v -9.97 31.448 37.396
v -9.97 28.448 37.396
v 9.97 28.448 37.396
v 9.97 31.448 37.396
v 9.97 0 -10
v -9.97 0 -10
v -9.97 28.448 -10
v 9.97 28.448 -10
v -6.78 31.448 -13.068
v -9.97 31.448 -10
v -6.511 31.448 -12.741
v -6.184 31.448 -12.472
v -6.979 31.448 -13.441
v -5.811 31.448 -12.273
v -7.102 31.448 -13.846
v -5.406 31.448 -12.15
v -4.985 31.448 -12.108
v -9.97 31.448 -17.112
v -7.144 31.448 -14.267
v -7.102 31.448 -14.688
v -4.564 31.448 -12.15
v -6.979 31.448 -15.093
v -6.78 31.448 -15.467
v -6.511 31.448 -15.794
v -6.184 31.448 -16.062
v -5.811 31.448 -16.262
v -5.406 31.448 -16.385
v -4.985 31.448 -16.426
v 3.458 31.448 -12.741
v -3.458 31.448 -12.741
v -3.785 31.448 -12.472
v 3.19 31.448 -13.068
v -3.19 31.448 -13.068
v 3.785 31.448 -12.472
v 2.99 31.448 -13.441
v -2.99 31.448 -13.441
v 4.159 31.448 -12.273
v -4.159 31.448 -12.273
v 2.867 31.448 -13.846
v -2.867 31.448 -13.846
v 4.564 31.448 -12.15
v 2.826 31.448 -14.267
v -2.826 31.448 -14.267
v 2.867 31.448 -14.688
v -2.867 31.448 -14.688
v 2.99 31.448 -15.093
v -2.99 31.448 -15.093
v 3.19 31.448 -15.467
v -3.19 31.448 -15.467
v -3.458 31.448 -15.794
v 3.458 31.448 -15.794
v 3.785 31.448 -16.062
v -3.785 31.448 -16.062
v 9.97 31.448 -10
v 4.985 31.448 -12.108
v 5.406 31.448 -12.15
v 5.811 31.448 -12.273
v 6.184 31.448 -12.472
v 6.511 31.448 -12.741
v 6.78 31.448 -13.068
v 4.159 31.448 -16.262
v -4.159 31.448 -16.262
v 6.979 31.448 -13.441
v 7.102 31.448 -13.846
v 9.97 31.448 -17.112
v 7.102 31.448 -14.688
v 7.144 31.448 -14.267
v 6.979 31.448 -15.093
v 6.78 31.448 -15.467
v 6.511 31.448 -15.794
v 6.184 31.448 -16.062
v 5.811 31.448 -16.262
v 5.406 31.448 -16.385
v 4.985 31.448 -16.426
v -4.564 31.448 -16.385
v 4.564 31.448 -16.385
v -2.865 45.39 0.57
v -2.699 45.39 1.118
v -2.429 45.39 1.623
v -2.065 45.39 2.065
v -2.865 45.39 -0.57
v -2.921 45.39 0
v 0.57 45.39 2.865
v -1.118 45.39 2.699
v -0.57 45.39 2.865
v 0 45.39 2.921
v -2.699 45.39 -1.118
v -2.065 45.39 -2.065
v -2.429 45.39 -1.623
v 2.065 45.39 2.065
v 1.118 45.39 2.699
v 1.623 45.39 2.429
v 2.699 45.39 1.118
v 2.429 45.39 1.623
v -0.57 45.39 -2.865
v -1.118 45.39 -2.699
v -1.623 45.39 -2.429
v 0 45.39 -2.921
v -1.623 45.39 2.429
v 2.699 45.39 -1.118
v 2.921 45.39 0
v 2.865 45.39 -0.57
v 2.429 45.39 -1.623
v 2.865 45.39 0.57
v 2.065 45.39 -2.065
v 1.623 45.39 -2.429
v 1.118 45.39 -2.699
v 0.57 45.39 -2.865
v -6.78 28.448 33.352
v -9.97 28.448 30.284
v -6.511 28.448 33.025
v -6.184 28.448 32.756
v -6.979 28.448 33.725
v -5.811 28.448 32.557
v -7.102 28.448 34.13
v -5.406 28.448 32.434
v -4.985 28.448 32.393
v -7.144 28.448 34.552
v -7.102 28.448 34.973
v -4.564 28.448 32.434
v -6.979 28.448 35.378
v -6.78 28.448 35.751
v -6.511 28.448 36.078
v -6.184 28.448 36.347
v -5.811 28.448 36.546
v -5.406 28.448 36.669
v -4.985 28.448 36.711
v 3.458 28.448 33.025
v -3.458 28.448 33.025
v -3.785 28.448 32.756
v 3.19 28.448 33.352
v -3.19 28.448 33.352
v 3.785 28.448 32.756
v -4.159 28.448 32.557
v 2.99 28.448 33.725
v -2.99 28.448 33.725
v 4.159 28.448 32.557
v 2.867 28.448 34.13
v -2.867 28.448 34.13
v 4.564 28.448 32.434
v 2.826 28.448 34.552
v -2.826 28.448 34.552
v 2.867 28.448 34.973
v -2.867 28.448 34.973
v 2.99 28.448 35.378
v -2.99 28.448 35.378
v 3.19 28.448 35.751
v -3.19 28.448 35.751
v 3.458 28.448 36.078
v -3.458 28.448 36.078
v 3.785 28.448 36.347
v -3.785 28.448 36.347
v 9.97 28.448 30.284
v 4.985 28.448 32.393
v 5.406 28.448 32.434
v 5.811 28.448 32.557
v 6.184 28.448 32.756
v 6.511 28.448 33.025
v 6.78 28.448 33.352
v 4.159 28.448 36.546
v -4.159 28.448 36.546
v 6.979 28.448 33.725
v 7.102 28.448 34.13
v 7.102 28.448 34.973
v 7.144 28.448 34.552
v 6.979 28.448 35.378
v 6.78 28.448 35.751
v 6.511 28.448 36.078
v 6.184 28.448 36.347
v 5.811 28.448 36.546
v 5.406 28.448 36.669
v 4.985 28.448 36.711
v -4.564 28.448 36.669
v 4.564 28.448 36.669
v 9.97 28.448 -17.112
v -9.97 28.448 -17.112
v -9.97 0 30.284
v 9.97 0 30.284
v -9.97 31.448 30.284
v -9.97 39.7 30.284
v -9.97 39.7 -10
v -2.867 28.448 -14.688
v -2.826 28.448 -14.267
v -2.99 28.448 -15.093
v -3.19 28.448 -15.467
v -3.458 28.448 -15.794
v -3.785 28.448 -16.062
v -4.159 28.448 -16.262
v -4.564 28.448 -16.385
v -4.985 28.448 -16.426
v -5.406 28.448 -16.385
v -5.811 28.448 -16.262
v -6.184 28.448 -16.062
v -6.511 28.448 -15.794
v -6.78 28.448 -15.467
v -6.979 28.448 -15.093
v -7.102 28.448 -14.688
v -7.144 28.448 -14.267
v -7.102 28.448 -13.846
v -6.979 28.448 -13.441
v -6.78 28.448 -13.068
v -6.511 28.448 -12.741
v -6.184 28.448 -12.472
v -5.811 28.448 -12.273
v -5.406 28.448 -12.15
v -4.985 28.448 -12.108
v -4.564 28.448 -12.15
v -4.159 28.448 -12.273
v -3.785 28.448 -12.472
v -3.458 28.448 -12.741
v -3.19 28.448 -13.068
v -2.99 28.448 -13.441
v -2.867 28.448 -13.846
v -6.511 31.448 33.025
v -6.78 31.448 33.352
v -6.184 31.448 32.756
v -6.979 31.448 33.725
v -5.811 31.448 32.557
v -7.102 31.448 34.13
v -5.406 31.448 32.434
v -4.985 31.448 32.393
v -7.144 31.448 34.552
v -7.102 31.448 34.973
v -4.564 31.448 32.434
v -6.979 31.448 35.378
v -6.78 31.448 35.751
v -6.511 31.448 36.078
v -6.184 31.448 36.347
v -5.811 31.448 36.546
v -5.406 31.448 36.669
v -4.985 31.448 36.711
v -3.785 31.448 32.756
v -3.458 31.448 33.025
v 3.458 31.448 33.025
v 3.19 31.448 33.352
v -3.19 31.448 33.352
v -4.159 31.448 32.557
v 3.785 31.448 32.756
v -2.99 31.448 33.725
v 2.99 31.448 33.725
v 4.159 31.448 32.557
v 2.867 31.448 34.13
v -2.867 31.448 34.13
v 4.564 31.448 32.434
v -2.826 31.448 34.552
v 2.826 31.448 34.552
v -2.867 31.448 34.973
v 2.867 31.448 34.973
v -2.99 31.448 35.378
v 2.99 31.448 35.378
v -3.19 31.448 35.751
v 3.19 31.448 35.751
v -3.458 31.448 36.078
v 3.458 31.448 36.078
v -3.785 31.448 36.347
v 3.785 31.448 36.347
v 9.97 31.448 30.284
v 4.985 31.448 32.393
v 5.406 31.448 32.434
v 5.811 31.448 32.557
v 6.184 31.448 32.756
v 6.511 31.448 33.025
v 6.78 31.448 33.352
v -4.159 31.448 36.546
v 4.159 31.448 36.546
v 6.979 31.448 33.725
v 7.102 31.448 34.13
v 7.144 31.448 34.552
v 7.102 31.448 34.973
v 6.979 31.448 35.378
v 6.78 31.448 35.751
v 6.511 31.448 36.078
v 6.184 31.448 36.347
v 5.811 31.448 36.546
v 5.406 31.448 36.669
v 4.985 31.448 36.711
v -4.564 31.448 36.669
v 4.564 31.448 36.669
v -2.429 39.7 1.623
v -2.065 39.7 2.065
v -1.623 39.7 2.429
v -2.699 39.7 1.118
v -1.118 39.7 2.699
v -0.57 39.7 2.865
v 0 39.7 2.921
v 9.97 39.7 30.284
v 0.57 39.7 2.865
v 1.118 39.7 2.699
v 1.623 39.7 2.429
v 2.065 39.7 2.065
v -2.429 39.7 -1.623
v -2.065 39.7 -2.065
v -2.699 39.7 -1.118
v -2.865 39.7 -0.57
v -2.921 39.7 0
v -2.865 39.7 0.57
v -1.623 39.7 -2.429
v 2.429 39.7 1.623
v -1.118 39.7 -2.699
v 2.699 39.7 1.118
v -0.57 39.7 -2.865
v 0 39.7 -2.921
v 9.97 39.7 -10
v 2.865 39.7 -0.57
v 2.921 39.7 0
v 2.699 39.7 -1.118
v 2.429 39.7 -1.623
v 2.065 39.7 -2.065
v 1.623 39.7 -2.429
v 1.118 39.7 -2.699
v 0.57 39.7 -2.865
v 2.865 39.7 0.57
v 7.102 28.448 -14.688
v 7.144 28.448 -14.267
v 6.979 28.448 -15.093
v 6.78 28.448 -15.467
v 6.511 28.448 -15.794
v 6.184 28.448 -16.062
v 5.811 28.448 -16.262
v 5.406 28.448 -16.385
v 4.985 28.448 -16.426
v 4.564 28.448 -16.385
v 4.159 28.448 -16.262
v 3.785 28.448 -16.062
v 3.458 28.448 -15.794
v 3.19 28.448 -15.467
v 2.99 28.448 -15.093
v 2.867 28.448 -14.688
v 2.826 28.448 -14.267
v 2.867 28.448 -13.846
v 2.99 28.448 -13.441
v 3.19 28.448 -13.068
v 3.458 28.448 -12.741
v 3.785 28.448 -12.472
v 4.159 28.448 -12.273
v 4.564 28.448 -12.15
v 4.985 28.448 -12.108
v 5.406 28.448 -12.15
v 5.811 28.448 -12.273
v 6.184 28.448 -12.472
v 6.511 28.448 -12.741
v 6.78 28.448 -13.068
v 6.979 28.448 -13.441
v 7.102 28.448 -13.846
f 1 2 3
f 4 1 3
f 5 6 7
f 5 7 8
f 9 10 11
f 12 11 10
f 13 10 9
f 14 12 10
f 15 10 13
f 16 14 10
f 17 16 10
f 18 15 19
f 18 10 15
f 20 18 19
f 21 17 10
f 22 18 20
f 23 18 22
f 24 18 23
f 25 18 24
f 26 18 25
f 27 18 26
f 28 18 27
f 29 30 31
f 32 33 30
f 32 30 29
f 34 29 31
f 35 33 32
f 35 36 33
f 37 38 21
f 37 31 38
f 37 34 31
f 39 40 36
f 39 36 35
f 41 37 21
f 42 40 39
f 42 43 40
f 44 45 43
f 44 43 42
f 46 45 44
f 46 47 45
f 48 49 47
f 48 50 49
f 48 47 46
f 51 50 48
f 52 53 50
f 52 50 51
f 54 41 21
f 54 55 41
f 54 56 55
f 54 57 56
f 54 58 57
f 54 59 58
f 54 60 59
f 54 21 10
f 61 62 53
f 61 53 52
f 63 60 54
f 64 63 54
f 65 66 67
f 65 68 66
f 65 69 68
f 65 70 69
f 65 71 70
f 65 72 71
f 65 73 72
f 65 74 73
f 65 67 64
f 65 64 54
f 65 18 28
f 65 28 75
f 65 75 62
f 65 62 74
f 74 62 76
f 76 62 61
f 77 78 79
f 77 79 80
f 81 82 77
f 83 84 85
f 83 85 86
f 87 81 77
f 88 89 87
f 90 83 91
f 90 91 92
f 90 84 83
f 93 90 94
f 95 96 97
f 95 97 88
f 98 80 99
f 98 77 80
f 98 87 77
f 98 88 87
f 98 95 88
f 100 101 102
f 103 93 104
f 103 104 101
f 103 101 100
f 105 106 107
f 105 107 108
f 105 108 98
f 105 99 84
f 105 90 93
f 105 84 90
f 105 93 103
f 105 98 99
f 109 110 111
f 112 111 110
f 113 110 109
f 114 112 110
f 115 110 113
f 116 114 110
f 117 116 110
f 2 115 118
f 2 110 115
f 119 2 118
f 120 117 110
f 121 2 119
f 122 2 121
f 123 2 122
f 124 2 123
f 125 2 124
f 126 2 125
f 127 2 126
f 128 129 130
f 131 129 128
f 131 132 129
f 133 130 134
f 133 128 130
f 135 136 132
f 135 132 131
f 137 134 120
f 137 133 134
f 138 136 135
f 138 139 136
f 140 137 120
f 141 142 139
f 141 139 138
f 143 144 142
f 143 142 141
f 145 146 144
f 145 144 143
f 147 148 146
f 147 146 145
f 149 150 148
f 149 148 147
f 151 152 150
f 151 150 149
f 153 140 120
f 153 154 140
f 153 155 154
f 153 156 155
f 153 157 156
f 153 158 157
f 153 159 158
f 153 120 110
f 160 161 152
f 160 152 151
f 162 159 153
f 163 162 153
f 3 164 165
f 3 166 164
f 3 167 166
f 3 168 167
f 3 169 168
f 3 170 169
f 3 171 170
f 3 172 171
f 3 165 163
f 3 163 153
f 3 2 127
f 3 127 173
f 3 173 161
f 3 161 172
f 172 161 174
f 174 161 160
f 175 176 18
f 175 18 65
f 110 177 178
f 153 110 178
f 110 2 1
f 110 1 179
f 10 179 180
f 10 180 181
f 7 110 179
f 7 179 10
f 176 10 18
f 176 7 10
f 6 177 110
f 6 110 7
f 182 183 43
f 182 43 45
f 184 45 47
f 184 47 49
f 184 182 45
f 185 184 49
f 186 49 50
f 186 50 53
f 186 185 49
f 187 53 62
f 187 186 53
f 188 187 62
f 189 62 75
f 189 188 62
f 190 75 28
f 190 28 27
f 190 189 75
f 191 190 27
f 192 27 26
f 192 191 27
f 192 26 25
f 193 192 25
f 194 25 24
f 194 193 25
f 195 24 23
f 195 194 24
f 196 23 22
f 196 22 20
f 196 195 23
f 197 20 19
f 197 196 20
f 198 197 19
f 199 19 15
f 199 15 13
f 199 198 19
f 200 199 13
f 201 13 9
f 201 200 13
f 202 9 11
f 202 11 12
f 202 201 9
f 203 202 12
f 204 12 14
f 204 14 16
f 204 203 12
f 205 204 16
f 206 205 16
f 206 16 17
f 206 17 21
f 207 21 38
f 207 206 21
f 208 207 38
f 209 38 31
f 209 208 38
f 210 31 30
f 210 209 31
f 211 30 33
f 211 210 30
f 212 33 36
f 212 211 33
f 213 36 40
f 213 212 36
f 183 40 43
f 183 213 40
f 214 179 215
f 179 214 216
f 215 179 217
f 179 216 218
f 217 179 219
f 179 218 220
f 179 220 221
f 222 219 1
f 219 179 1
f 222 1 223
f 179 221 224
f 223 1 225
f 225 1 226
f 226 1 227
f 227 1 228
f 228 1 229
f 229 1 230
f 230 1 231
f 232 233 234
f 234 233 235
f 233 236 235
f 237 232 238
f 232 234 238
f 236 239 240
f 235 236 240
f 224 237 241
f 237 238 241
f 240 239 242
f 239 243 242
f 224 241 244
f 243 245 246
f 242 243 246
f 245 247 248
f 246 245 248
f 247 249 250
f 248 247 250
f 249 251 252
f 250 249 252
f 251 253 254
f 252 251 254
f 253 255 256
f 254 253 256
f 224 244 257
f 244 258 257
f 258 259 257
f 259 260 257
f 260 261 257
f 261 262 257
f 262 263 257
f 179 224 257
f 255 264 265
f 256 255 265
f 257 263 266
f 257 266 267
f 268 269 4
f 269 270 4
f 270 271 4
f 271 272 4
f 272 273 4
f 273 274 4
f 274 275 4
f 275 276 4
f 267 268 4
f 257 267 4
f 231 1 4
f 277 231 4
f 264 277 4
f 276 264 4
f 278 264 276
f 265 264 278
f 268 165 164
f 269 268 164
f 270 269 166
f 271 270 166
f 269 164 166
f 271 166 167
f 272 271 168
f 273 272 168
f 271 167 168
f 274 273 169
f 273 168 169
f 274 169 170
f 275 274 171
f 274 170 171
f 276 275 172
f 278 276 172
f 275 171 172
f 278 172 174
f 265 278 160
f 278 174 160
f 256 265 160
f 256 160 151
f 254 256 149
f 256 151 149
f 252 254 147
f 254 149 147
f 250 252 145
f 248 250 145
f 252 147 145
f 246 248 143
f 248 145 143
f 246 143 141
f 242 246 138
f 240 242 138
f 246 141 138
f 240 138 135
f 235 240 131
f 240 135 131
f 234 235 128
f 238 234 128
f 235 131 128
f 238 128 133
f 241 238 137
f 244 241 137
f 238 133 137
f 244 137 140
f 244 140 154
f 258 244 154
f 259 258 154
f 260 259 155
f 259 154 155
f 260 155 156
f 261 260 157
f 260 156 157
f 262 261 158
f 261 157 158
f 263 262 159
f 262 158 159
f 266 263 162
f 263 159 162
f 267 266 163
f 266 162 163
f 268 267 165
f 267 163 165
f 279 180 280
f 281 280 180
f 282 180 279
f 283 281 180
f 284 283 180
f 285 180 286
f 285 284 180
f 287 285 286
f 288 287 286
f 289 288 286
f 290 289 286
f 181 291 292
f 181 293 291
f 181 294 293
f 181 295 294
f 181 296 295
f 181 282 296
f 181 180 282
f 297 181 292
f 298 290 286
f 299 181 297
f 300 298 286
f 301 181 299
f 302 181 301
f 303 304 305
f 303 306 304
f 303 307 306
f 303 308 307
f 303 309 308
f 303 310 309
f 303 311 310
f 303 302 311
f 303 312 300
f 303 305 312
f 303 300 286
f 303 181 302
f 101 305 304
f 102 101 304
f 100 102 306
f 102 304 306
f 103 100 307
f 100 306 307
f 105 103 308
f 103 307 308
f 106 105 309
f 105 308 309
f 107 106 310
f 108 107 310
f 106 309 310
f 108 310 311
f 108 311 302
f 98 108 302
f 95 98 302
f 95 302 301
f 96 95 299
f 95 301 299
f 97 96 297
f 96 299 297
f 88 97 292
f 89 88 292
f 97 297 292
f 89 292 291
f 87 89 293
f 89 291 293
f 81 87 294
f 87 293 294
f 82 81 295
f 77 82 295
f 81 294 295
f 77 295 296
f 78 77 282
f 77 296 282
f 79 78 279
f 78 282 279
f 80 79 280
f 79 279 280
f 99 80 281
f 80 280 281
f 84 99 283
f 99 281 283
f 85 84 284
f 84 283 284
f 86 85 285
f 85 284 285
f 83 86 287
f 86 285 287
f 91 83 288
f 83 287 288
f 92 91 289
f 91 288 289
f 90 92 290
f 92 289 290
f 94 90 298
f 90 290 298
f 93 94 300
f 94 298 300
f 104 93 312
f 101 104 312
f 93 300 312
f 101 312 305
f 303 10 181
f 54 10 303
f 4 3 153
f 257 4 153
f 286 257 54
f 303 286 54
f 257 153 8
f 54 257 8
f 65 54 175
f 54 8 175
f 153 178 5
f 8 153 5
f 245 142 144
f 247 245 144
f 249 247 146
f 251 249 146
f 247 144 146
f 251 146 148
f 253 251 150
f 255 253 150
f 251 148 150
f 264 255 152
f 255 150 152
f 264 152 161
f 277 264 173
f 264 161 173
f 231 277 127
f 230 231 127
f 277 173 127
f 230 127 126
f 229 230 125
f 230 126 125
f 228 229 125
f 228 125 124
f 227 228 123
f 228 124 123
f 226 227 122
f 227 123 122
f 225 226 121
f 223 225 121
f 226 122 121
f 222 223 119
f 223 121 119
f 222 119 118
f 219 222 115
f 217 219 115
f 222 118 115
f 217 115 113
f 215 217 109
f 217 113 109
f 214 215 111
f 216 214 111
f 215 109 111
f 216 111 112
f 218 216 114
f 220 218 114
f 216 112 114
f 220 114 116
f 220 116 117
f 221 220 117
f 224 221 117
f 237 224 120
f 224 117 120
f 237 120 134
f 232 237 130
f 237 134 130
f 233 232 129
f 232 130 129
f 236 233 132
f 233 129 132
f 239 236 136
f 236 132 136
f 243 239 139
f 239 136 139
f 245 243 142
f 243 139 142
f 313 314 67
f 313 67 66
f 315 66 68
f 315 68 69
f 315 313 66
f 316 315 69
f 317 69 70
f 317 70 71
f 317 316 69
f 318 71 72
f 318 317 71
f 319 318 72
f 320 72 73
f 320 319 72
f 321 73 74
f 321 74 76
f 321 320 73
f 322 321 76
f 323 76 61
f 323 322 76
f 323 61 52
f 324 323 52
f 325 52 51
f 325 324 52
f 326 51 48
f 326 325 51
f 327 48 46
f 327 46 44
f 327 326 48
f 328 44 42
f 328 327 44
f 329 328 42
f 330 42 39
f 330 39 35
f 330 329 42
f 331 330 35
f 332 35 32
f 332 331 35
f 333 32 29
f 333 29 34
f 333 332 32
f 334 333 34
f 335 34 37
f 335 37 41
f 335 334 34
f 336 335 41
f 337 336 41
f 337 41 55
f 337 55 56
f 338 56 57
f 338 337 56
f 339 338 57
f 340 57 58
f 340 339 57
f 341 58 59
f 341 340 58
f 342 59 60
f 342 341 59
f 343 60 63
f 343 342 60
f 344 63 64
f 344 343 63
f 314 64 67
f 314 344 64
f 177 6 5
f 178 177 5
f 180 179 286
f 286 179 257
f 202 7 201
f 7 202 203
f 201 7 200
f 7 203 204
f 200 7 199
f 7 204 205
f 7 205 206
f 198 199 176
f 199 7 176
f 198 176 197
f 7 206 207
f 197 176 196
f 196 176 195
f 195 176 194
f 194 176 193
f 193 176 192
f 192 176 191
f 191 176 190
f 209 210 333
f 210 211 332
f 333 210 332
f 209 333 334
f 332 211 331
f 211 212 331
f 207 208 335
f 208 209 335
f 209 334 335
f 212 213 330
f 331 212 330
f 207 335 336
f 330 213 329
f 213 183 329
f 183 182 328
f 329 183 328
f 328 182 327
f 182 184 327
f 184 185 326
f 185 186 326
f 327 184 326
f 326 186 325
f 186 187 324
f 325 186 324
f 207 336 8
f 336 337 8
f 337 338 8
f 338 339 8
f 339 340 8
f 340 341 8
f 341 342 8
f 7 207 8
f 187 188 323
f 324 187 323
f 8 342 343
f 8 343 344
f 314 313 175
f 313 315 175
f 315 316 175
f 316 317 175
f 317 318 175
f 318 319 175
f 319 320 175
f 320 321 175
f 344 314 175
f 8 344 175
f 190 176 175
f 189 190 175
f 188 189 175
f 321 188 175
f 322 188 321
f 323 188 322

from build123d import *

# Parameters (mm, degrees)
SKETCH1_W   = 19.939
SKETCH1_H   = 40.2844
BODY_DEPTH  = 39.7002
SKETCH2_R   = 2.921
AXLE_DEPTH  = 5.6896
WINGS_START = 28.448
SKETCH3_W   = 19.939
SKETCH3_H   = 7.112
SKETCH3_R   = 2.159
WINGS_DEPTH = 3


with BuildPart() as part:
    # Sketch1 → Body (new body)
    with BuildSketch(Plane(origin=(0, 0, 0), x_dir=(1, 0, 0), z_dir=(0, 1, 0))):
        with Locations((0, -10.1422)):
            Rectangle(SKETCH1_W, SKETCH1_H)
    extrude(amount=BODY_DEPTH)

    # Sketch2 → Axle (add)
    with BuildSketch(Plane(origin=(0, 39.7002, 0), x_dir=(1, 0, 0), z_dir=(0, 1, 0))):
        Circle(SKETCH2_R)
    extrude(amount=AXLE_DEPTH)

    # Sketch3 → Wings (add)
    with BuildSketch(Plane(origin=(0, 0, 0), x_dir=(1, 0, 0), z_dir=(0, 1, 0)).offset(WINGS_START)):
        with Locations((0, 13.556)):
            Rectangle(SKETCH3_W, SKETCH3_H)
        with Locations((4.98475, 14.2672)):
            Circle(SKETCH3_R, mode=Mode.SUBTRACT)
        with Locations((-4.98475, 14.2672)):
            Circle(SKETCH3_R, mode=Mode.SUBTRACT)
    wings = extrude(amount=WINGS_DEPTH)

    # Mirror1: Wings across plane
    add(wings.mirror(Plane.XY.offset(10.1422)))


solid = part.part
